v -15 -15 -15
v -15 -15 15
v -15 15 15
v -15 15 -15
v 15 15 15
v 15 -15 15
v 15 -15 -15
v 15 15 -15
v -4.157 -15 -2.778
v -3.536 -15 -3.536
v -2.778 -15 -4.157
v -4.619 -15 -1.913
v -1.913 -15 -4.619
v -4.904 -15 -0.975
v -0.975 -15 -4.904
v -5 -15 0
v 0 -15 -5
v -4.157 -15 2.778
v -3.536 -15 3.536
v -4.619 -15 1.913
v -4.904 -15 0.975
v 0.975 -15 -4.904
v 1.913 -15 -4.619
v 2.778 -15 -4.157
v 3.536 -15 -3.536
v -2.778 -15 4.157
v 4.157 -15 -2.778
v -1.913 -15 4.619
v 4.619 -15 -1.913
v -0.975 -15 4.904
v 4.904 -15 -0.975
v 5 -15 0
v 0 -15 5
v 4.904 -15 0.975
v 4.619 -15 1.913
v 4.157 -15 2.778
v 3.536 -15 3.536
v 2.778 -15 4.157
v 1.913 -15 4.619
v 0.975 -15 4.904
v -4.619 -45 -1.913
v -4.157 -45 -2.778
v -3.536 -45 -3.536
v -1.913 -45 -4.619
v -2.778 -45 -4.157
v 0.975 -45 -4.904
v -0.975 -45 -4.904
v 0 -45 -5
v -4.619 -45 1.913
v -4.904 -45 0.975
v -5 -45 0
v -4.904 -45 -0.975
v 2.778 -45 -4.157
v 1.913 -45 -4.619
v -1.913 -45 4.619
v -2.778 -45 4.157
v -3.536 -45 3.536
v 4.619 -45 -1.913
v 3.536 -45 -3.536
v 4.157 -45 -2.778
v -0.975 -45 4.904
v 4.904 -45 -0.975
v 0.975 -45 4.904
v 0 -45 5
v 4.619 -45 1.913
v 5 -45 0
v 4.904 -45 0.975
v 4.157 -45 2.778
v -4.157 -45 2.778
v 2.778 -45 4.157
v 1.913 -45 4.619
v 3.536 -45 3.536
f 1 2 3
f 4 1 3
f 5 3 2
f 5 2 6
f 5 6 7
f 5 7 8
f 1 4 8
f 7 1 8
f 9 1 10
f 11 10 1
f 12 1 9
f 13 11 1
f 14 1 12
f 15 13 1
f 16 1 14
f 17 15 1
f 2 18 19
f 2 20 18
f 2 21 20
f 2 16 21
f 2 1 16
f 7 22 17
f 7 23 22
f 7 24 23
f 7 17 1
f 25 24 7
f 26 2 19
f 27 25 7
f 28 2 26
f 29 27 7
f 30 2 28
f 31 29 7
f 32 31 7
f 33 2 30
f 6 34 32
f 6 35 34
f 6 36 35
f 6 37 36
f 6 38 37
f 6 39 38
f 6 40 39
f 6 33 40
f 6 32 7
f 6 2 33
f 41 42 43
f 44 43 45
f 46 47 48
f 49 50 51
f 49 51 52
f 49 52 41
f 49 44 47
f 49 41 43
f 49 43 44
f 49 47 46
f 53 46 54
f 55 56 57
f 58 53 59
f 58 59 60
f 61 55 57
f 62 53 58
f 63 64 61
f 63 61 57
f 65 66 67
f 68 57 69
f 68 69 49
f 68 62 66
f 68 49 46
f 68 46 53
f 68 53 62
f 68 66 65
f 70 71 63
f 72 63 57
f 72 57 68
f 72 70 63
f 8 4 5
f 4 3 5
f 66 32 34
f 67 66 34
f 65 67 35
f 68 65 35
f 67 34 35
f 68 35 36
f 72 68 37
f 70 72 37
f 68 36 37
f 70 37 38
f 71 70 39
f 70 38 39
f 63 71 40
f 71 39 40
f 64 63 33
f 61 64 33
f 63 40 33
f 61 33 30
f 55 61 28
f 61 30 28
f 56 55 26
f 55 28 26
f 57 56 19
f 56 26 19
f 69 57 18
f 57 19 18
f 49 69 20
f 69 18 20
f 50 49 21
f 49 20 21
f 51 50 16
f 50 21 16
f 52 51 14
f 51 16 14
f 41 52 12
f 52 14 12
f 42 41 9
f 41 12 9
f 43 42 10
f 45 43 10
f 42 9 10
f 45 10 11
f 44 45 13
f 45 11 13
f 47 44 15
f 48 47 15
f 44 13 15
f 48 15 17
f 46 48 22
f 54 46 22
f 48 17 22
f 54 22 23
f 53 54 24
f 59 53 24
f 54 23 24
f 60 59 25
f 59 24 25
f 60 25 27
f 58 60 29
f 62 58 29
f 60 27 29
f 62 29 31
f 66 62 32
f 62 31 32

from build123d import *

# Parameters (mm, degrees)
F0_W     = 30
F0_H     = 30
F1_DEPTH = 15
F2_R     = 5
F3_DEPTH = 30


# Not quite as in the source:
# - a feature of the source that left no trace in its solid (it failed there, or was rolled back) is left out


with BuildPart() as f1:
    # F0 (on Top) → F1 (new body, symmetric)
    with BuildSketch(Plane.XY):
        Rectangle(F0_W, F0_H)
    extrude(amount=F1_DEPTH, both=True)

    # F2 (on face) → F3 (join)
    with BuildSketch(Plane.XZ.offset(15)):
        Circle(F2_R)
    extrude(amount=F3_DEPTH)


solid = f1.part
